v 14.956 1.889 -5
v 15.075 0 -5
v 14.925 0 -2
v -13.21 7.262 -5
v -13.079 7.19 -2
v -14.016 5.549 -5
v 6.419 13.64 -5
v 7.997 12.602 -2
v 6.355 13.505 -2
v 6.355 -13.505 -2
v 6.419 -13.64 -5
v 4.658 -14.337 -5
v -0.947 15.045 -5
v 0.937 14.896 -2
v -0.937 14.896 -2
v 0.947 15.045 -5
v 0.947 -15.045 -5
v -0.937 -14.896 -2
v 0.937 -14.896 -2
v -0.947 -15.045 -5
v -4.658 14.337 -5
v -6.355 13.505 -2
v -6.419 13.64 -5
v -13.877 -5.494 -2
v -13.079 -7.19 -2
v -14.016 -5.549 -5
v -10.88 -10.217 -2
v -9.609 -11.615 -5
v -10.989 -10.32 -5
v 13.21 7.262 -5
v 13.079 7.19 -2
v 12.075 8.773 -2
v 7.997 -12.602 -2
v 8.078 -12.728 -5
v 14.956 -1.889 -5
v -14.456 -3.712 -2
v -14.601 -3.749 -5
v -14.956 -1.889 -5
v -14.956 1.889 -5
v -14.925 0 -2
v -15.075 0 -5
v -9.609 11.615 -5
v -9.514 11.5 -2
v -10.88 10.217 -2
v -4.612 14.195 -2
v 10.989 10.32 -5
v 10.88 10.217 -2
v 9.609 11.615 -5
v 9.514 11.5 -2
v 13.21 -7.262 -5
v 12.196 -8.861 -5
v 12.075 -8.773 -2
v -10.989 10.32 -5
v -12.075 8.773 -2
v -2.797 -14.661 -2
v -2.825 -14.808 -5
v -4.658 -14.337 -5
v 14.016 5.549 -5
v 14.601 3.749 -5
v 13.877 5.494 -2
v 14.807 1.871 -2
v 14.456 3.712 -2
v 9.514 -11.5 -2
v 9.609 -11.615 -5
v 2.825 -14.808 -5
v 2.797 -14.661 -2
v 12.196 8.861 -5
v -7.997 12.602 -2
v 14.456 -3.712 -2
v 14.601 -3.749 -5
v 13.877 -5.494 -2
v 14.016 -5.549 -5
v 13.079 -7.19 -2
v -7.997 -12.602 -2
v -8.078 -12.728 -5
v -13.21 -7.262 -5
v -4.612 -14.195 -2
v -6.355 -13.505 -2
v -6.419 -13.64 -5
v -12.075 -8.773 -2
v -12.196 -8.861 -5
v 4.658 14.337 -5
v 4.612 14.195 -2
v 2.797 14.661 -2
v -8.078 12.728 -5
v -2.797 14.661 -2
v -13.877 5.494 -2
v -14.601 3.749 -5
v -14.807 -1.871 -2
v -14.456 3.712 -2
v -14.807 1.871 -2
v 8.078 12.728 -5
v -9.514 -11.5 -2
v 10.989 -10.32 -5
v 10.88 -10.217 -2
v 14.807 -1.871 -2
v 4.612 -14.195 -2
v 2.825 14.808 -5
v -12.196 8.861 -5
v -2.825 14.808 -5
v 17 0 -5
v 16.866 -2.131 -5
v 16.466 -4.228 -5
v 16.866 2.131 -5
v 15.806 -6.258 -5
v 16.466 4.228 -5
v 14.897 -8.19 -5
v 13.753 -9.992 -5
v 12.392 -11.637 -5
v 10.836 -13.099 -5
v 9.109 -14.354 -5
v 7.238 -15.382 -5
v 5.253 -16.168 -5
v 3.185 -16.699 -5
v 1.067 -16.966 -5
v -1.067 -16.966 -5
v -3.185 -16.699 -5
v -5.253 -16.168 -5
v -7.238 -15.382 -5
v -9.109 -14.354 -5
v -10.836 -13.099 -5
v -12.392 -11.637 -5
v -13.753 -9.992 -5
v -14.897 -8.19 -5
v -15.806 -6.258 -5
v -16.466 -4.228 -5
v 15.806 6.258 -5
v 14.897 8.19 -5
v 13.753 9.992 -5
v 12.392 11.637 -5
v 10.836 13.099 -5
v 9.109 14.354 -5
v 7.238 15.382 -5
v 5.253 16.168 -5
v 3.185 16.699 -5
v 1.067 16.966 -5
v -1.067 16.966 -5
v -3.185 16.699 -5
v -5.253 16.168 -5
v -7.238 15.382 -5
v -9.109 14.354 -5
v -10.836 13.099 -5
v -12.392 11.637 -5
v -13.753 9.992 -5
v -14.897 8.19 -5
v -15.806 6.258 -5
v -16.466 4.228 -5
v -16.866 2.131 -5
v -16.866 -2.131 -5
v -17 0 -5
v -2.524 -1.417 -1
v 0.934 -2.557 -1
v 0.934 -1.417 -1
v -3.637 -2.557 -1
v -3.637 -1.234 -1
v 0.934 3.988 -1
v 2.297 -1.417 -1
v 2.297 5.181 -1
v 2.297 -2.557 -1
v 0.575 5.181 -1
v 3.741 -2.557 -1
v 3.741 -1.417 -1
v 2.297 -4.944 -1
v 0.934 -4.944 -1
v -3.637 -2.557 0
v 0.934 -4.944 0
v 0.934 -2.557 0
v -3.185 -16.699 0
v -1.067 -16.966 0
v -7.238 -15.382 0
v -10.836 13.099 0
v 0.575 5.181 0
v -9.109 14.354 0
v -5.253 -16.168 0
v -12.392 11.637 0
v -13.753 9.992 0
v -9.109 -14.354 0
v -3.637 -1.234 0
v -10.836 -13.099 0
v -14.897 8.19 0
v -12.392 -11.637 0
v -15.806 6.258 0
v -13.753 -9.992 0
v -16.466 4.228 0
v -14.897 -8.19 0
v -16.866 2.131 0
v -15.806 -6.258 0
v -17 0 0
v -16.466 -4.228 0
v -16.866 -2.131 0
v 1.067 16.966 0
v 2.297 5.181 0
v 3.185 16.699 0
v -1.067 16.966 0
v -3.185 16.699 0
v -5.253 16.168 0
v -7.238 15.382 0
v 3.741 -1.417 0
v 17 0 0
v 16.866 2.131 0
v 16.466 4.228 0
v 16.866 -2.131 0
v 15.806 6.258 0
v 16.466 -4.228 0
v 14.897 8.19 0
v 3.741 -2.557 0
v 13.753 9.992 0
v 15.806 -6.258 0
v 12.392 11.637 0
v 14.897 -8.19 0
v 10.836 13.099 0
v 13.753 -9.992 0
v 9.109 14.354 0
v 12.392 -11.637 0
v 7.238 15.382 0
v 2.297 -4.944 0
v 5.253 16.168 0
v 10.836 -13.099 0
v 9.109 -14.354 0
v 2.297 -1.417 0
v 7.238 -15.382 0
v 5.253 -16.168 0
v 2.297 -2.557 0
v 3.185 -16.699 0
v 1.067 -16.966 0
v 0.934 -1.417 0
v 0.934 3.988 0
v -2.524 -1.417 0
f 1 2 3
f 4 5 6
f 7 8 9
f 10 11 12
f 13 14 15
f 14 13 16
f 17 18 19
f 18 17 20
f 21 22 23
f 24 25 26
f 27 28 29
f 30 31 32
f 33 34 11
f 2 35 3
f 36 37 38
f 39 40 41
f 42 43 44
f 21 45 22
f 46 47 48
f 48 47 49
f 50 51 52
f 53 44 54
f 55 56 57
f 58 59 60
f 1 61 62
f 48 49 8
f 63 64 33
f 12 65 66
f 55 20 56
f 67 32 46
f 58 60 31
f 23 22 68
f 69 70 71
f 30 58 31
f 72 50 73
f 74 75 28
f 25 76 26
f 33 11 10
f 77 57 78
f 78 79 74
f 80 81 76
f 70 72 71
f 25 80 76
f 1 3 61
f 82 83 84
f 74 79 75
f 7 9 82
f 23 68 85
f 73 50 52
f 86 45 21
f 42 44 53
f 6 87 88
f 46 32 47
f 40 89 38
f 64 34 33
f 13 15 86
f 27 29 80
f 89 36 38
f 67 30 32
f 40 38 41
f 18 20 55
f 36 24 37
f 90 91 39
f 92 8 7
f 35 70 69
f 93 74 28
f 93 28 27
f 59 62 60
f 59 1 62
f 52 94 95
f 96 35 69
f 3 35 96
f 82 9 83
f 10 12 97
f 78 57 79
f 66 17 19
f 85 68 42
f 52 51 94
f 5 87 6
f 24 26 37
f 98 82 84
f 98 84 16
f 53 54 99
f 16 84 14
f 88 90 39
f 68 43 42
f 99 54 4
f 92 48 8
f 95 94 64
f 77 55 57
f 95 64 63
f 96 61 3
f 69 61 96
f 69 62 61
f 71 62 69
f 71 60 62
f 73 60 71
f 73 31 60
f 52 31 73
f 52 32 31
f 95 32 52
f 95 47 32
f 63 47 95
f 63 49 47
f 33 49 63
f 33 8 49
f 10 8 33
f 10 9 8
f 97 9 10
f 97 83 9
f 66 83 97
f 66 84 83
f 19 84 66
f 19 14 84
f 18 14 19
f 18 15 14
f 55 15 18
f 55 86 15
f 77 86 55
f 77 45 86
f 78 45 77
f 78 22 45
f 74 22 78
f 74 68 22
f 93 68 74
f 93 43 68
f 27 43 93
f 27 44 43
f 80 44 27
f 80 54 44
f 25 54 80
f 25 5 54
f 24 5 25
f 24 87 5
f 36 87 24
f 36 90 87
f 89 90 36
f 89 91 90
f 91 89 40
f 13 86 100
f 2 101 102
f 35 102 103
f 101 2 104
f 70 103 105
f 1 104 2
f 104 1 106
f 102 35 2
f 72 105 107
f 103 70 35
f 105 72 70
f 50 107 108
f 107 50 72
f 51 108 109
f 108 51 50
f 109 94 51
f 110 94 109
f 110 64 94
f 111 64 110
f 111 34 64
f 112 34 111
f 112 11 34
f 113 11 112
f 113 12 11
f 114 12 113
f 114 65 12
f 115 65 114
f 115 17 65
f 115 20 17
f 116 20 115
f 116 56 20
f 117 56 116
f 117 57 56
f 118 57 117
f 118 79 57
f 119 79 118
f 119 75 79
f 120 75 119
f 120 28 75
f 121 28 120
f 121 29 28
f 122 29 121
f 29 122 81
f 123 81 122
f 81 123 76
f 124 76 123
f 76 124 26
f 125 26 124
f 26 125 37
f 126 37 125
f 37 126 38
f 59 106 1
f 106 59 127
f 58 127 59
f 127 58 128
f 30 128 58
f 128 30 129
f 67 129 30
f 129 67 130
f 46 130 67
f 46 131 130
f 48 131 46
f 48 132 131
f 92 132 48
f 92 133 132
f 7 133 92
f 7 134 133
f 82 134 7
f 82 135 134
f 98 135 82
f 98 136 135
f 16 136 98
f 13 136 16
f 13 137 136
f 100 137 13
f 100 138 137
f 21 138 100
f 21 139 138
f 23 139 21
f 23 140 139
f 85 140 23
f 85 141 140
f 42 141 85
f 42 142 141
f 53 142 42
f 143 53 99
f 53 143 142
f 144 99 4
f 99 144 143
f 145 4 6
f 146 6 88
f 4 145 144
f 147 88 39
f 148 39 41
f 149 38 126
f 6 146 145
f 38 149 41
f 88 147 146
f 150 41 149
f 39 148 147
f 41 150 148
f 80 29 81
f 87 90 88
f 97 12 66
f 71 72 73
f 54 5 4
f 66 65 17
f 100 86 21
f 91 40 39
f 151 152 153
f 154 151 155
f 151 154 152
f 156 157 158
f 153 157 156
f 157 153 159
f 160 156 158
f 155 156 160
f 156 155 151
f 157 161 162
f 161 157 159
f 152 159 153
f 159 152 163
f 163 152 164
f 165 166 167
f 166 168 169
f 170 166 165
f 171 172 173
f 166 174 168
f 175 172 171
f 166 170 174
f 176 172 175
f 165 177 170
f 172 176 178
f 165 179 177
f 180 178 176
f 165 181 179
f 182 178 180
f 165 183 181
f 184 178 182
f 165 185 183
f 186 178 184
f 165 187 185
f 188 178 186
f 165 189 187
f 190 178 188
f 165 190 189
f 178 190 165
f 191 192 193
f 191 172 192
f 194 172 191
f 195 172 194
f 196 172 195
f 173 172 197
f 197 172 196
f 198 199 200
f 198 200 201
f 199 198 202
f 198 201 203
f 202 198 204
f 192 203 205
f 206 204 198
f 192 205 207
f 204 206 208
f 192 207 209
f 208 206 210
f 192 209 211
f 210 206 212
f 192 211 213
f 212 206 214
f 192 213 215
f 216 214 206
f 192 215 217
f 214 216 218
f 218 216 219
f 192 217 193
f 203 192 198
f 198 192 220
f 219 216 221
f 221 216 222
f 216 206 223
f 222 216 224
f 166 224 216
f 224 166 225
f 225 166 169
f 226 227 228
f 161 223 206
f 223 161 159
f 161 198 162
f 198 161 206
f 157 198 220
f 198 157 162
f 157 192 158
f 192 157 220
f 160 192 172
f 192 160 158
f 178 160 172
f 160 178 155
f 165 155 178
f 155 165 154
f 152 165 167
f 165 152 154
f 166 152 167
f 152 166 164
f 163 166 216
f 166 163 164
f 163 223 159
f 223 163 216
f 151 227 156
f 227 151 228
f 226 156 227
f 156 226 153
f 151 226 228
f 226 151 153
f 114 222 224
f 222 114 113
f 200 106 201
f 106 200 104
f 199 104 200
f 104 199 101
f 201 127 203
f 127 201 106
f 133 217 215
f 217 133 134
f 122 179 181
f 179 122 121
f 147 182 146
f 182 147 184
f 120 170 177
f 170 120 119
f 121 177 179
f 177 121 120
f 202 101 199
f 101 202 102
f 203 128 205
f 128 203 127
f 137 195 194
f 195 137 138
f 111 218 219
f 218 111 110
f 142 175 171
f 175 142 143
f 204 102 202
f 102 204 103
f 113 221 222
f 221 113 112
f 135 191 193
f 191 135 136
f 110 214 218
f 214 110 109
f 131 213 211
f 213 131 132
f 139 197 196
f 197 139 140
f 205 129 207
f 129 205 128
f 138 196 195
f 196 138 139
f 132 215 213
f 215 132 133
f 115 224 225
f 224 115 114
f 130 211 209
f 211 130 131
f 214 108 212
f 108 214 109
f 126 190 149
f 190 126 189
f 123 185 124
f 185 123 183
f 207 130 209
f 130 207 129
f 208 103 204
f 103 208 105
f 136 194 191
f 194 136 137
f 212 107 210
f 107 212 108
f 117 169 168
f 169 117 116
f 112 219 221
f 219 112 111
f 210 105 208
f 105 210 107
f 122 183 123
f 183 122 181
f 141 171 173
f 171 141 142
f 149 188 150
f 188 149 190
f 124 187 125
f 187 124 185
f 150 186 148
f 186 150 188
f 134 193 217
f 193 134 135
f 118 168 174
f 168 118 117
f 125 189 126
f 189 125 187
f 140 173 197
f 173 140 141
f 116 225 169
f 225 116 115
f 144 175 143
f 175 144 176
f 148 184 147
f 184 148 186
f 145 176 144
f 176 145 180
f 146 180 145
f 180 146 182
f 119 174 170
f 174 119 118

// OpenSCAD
$fn = 50;

difference() {
	union() {
		translate(v = [0, 0, -5.0]) {
			cylinder(h = 5, r = 17.0);
		}
	}
	union() {
		#translate(v = [0, 0, -5.0]) {
			cylinder(h = 3, r1 = 15.075, r2 = 14.925);
		}
		translate(v = [0, 0, -1]) {
			linear_extrude(height = 1) {
				text(font = "Impact", halign = "center", size = 10, text = "4", valign = "center");
			}
		}
	}
}
